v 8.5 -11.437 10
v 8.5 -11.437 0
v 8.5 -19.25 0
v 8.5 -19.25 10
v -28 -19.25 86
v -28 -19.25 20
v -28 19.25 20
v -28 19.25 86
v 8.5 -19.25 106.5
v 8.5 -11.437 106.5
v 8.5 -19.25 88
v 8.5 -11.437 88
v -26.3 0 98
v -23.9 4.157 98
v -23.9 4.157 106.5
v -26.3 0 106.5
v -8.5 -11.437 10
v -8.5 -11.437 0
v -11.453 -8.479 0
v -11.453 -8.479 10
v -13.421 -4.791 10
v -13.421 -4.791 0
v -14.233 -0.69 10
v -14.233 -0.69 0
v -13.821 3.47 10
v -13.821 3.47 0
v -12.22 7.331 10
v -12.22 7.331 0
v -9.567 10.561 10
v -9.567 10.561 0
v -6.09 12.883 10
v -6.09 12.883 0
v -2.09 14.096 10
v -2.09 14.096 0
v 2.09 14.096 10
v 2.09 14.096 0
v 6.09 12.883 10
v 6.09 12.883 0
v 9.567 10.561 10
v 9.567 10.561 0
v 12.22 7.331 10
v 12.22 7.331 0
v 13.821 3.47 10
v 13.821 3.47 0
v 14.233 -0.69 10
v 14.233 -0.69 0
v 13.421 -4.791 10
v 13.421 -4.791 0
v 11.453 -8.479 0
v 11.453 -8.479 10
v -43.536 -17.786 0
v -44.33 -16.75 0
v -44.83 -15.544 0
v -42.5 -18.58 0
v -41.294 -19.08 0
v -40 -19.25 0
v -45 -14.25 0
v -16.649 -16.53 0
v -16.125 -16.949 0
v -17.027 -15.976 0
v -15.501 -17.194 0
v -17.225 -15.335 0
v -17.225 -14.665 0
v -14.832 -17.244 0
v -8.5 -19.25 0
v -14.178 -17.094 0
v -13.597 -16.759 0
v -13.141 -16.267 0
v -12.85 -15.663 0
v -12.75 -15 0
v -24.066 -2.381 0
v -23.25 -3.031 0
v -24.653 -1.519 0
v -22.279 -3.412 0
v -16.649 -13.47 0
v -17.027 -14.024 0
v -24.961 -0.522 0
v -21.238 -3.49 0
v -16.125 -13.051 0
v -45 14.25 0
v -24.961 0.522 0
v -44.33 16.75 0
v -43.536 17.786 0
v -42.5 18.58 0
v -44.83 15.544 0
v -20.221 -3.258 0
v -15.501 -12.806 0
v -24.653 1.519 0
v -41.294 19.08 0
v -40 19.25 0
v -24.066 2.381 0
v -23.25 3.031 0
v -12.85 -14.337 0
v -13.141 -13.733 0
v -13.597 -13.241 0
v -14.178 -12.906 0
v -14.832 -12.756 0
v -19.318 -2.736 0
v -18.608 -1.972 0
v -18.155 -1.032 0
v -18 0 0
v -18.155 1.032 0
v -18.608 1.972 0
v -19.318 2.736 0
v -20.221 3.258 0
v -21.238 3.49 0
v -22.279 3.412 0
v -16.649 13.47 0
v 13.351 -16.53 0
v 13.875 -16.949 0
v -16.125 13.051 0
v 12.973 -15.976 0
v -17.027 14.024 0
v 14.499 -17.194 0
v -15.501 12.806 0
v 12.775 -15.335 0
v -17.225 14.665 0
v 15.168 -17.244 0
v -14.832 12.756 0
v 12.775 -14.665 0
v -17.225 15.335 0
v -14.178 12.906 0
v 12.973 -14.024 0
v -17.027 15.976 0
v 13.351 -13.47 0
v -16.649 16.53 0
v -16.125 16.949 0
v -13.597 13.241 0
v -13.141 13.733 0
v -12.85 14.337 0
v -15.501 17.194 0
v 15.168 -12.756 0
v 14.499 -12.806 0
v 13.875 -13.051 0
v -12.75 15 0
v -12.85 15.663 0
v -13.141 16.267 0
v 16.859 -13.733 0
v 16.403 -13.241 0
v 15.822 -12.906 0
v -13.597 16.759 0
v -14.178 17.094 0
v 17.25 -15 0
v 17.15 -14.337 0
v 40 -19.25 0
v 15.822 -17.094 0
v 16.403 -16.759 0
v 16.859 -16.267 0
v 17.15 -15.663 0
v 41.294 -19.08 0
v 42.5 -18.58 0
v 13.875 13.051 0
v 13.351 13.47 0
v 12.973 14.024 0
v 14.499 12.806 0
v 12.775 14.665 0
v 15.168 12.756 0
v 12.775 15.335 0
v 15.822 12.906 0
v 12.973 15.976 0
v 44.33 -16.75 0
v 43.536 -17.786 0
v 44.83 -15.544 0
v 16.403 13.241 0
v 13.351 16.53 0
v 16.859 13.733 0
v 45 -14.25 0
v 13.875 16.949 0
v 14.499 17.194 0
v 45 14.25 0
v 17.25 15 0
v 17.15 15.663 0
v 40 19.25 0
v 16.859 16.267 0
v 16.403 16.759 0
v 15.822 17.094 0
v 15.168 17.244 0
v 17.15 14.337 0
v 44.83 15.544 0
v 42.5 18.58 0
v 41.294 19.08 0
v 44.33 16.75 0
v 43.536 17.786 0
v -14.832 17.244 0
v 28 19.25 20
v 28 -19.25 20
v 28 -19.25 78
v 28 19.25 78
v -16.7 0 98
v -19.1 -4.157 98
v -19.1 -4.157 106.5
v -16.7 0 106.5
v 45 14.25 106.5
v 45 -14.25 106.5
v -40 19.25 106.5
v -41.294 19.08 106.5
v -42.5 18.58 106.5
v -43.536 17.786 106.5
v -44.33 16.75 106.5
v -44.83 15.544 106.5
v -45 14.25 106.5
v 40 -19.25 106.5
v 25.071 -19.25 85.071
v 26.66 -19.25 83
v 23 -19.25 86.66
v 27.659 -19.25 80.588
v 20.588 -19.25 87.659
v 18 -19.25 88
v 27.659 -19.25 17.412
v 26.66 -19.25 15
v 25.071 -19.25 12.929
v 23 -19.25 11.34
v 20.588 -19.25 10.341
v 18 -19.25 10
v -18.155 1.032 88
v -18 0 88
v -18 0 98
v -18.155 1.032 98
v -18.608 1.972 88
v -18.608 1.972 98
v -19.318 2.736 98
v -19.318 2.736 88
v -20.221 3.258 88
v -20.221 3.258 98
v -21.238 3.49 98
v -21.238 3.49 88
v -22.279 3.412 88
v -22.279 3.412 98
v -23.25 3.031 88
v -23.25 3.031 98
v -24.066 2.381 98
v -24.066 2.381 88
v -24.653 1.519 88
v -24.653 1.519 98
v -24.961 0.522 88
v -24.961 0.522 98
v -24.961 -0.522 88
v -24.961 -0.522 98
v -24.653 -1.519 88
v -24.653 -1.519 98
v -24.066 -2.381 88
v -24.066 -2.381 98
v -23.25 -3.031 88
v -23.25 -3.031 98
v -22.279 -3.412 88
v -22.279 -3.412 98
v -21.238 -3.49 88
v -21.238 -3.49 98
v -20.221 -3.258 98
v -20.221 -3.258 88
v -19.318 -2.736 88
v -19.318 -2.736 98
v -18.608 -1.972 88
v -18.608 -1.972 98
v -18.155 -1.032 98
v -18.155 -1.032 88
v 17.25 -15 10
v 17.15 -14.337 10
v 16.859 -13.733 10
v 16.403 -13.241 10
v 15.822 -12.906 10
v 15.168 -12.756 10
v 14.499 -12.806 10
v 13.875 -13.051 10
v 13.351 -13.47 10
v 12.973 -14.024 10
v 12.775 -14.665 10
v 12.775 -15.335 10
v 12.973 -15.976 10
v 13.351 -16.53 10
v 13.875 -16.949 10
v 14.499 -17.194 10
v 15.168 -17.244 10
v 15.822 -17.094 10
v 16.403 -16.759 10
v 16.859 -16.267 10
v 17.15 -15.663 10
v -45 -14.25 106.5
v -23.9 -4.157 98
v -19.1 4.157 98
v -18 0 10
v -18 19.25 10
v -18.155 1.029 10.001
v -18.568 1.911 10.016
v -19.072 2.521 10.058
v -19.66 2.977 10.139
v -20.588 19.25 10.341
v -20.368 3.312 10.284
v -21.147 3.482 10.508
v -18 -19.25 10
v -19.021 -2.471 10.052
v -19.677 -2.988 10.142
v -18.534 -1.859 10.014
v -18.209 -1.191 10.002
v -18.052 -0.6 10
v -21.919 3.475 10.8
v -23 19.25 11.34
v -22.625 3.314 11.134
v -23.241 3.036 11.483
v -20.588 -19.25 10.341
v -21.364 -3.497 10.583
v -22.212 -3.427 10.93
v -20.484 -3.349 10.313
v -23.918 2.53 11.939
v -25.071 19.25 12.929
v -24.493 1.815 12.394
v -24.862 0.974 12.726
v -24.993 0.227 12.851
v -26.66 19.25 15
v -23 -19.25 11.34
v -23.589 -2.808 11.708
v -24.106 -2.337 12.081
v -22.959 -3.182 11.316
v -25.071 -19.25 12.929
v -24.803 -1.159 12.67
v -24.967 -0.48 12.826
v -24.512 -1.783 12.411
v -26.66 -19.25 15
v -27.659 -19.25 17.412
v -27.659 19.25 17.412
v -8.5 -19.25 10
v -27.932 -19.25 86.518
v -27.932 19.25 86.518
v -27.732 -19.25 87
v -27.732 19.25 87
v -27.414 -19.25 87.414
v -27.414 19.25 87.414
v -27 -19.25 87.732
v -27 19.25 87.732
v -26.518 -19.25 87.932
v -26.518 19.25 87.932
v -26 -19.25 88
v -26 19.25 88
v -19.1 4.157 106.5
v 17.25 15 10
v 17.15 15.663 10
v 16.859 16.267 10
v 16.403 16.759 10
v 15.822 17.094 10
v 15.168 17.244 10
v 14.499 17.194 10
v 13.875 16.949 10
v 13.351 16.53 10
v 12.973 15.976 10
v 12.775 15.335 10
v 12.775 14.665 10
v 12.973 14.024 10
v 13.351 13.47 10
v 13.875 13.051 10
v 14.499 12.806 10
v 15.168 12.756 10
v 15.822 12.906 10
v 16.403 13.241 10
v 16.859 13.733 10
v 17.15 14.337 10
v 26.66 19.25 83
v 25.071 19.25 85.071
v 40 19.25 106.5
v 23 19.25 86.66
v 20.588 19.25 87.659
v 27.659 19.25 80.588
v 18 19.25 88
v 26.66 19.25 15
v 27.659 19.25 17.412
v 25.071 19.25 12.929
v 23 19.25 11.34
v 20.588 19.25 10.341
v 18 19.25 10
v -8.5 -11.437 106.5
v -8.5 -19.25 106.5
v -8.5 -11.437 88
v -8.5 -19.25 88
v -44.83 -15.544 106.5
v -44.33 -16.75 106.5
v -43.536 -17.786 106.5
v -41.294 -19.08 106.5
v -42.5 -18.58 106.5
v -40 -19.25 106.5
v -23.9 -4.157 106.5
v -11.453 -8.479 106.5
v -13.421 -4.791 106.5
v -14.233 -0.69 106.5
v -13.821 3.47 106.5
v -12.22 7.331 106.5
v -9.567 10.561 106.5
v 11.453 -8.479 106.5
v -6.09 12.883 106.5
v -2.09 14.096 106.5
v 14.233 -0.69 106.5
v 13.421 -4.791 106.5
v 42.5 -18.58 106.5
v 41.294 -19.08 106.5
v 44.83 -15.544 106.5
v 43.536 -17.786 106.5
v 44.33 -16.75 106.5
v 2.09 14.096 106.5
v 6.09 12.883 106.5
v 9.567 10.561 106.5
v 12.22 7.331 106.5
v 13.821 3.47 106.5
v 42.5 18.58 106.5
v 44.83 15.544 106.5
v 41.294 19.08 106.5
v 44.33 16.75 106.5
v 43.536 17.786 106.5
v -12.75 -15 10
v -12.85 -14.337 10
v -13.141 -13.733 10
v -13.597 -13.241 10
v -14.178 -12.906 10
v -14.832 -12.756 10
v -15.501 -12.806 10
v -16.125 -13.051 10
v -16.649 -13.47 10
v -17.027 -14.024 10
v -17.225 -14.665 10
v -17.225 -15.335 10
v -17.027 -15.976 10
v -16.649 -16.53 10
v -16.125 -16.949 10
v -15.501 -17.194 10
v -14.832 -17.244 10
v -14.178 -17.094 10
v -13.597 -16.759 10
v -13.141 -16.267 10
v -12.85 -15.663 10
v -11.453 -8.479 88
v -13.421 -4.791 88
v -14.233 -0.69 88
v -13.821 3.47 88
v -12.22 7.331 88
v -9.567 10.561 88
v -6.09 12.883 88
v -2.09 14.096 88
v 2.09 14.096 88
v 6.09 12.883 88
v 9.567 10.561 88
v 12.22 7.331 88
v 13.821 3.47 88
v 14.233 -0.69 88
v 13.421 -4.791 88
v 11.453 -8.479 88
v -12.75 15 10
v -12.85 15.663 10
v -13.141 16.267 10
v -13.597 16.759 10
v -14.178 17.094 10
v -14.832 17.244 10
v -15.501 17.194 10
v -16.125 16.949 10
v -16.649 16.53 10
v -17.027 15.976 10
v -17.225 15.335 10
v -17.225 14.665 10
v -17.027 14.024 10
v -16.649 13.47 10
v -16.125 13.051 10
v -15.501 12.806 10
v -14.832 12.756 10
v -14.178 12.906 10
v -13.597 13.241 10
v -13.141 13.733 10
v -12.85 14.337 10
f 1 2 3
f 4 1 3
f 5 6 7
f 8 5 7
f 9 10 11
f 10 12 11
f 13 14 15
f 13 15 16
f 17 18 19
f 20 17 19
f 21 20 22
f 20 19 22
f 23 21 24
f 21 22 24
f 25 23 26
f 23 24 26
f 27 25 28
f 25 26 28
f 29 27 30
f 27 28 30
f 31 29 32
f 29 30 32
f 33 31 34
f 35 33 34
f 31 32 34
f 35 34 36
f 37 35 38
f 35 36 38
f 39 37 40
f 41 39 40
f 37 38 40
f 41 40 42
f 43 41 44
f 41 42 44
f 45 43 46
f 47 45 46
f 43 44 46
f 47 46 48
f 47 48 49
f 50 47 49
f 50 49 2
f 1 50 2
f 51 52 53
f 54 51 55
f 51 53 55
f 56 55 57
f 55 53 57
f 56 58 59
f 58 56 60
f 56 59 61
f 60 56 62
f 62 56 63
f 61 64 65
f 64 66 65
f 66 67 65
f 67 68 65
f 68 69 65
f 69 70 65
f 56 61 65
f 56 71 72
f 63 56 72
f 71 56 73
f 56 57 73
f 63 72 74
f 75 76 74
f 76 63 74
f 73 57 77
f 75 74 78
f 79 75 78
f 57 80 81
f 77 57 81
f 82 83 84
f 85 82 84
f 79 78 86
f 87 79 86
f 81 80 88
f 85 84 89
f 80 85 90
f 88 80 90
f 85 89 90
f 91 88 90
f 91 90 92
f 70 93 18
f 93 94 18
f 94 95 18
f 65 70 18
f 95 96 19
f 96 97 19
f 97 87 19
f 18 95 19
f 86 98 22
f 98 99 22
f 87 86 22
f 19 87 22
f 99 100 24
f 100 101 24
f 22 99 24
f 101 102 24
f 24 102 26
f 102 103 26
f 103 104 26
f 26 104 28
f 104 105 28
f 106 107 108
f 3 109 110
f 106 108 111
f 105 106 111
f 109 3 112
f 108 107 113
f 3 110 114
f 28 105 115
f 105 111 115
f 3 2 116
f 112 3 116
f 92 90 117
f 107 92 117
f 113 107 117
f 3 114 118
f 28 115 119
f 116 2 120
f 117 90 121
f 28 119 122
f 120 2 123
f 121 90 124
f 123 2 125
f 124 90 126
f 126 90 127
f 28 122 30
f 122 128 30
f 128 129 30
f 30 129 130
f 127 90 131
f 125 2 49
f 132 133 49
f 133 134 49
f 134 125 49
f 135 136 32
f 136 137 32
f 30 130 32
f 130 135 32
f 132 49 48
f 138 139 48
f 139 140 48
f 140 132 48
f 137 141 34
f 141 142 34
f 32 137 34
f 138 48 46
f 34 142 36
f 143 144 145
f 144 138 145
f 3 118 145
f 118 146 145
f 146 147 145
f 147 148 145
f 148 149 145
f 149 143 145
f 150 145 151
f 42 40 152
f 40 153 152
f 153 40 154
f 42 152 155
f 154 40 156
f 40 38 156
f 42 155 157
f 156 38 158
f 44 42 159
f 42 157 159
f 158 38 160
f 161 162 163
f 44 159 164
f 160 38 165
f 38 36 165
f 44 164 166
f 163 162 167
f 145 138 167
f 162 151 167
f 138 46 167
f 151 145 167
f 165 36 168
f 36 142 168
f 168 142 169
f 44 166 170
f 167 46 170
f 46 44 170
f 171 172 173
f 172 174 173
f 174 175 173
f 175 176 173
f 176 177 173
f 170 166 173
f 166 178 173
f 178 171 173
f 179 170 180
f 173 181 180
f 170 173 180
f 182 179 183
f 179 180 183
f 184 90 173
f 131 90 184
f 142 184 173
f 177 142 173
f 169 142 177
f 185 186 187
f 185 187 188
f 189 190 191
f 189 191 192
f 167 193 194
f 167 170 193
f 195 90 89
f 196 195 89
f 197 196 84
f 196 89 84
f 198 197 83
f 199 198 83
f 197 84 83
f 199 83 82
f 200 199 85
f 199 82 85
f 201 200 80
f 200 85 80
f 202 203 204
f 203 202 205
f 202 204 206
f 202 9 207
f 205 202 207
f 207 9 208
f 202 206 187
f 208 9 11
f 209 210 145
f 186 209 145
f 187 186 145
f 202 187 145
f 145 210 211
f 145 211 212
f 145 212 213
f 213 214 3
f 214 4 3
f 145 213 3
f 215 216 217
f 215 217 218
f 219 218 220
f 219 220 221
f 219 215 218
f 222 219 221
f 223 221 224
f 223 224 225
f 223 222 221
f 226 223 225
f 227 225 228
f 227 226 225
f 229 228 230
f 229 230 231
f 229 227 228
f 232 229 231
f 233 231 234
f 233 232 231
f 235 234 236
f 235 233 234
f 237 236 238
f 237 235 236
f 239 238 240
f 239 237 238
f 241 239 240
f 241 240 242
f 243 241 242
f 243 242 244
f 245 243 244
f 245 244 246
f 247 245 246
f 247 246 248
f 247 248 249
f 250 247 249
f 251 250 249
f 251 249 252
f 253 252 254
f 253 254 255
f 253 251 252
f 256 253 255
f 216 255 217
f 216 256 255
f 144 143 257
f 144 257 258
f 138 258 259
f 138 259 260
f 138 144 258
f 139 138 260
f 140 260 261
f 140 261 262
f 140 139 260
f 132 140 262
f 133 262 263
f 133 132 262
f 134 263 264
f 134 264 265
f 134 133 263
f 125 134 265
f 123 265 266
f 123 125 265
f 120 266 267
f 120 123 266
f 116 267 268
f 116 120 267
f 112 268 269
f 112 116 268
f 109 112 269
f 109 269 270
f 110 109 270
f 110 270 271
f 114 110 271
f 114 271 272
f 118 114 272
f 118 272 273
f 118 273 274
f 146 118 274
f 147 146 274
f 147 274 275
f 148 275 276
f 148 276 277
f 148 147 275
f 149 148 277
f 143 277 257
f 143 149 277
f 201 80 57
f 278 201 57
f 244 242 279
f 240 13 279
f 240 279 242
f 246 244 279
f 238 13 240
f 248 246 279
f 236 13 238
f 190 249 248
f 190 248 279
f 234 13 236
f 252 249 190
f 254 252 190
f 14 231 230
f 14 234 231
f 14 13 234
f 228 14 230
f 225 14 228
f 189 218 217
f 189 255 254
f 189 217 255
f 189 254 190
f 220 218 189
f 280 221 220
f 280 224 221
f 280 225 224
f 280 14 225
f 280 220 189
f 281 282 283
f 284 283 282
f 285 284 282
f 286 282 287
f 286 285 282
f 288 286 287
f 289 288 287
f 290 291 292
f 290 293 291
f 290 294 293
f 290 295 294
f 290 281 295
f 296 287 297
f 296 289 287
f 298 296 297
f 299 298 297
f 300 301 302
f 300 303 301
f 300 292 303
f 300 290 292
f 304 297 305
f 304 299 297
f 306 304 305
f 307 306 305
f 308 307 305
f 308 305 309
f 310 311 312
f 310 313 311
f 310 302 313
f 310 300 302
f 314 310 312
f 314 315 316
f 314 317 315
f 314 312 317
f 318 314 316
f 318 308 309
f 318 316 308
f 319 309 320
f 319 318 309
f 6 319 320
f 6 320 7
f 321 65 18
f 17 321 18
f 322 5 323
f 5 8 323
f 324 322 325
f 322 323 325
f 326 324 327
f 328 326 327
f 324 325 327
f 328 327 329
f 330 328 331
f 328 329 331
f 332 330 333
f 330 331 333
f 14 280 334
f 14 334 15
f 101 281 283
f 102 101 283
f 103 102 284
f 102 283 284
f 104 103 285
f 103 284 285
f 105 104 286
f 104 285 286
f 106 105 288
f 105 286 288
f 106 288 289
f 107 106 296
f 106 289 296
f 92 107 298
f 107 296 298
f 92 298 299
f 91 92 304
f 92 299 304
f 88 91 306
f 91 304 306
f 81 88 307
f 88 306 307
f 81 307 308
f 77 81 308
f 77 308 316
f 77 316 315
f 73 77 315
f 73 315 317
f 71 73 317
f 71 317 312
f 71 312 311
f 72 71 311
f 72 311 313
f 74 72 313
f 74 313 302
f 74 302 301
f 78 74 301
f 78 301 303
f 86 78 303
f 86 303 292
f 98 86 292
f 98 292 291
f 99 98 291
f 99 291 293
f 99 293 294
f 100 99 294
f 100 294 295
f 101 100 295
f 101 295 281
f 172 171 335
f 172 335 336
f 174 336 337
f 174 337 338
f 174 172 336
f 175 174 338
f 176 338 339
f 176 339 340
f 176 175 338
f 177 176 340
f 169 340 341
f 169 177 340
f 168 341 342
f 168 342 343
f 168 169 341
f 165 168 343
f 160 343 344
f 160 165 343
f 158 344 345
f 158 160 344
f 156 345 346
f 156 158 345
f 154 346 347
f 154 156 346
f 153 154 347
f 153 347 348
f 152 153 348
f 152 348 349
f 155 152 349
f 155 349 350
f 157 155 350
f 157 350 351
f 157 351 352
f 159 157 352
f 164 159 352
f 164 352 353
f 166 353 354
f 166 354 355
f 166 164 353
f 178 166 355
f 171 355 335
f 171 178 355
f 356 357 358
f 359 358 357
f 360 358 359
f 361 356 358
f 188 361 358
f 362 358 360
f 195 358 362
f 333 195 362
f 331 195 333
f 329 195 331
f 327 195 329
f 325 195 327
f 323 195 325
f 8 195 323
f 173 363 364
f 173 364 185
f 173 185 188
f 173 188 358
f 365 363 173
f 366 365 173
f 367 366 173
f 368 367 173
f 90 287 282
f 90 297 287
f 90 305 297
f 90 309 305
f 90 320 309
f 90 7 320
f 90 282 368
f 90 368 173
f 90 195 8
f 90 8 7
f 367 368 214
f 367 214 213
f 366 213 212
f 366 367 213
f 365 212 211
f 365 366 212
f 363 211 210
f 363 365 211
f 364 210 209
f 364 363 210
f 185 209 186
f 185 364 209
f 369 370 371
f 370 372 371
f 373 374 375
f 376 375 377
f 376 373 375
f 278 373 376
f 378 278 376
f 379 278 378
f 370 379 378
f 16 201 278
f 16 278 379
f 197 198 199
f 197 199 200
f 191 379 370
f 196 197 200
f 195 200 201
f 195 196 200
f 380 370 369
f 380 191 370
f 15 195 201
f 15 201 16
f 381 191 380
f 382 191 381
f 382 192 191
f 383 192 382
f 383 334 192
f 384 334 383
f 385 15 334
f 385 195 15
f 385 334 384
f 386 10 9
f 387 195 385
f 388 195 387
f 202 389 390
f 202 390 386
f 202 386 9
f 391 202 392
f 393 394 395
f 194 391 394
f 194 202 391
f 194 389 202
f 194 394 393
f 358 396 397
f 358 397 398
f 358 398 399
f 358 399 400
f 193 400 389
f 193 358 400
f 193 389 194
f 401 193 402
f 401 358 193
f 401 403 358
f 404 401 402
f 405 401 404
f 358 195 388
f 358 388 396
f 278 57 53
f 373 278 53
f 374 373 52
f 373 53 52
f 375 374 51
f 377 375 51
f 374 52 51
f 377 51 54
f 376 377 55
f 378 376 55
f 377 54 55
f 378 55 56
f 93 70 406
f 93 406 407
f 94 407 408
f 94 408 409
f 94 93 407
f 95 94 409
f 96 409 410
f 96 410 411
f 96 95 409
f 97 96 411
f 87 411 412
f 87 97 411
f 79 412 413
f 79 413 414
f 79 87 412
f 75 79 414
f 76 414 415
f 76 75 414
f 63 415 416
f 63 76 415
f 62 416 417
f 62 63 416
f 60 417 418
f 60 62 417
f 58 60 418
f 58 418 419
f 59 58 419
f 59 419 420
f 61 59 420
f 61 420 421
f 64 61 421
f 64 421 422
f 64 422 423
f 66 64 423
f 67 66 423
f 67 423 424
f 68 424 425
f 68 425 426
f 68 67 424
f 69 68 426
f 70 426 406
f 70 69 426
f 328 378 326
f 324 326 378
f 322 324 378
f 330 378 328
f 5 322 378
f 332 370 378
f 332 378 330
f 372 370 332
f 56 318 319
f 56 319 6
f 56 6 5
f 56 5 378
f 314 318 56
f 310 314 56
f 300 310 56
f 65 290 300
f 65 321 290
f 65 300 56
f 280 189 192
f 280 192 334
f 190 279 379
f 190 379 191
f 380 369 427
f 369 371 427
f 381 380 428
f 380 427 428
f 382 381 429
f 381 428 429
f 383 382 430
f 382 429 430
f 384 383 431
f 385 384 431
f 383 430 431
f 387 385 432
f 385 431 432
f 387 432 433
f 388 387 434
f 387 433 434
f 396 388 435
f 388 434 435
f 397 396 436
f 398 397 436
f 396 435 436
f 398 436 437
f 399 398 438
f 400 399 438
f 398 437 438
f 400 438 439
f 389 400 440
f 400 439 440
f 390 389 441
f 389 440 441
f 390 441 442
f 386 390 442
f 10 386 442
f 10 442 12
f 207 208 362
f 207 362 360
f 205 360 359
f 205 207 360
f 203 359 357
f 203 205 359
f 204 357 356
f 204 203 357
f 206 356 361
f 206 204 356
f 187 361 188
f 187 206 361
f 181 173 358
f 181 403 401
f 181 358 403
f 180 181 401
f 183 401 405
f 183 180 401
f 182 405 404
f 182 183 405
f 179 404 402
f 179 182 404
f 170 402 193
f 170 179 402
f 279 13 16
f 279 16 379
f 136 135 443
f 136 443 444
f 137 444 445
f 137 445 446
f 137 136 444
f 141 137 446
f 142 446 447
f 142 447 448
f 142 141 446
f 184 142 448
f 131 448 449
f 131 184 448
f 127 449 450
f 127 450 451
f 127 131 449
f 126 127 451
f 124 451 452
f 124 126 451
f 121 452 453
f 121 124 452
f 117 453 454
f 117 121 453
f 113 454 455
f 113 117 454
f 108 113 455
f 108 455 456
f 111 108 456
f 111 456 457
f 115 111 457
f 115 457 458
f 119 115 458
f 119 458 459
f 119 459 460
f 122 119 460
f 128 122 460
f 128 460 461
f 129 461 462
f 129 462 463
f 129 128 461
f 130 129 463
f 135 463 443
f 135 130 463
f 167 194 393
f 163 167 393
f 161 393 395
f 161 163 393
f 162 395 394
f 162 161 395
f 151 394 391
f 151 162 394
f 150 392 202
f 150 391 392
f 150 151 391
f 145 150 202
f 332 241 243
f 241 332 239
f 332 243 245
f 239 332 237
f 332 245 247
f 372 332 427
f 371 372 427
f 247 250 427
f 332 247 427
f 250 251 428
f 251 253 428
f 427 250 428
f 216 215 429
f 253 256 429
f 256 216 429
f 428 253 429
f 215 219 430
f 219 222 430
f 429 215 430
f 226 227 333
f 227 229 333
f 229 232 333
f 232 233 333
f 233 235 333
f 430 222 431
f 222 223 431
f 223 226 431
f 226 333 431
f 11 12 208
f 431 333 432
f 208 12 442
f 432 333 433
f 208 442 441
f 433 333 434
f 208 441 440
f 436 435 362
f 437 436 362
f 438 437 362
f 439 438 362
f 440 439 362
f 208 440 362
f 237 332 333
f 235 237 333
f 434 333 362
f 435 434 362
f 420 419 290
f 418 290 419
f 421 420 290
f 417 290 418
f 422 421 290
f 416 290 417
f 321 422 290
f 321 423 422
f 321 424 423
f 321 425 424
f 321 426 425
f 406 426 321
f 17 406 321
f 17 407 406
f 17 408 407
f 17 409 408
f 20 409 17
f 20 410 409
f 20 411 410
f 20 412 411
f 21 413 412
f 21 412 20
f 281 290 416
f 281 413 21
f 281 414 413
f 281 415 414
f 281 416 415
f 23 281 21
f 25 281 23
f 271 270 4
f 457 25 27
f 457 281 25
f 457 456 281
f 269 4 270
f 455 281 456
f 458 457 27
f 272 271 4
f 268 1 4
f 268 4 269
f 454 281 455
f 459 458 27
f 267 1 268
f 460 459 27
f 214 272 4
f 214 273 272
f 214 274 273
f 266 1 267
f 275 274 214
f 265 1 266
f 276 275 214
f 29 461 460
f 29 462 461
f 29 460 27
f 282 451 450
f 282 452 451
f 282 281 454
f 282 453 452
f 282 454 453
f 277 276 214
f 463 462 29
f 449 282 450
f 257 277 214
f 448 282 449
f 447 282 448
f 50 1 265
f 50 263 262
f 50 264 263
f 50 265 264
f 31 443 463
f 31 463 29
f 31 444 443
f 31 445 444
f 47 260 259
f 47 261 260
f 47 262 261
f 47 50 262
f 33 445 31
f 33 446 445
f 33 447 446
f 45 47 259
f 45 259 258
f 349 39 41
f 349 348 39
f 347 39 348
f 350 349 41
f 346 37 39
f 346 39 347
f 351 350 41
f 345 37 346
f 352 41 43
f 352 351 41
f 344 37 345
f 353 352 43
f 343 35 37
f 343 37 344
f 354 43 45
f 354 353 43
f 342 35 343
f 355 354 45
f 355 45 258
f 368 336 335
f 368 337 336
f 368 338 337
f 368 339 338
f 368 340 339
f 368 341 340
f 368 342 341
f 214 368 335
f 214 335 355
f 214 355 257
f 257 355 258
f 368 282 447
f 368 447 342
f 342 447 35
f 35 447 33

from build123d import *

# Parameters (mm, degrees)
SKETCH1_R             = 2.25
BOSS_EXTRUDE1_DEPTH   = 10
BOSS_EXTRUDE3_DEPTH   = 78
BOSS_EXTRUDE3_2_DEPTH = 78
SKETCH4_R             = 3.5
BOSS_EXTRUDE4_DEPTH   = 10
BOSS_EXTRUDE5_DEPTH   = 8.5
SKETCH5_R             = 3.5
CUT_EXTRUDE1_DEPTH    = 110.542514578
FILLET2_R             = 2
FILLET3_R             = 10


with BuildPart() as part:
    # Sketch1 → Boss-Extrude1 (new body)
    with BuildSketch(Plane.XY):
        with BuildLine():
            Line((15, 19.25), (-15, 19.25))
            Line((-15, 19.25), (-30, 19.25))
            Line((-30, 19.25), (-40, 19.25))
            ThreePointArc((-40, 19.25), (-43.535533906, 17.785533906), (-45, 14.25))
            Line((-45, 14.25), (-45, -14.25))
            ThreePointArc((-45, -14.25), (-43.535533906, -17.785533906), (-40, -19.25))
            Line((-40, -19.25), (-30, -19.25))
            Line((-30, -19.25), (-15, -19.25))
            Line((-15, -19.25), (-8.5, -19.25))
            Line((-8.5, -19.25), (-8.5, -16.75))
            Line((-8.5, -16.75), (-8.5, -11.437329234))
            ThreePointArc((-8.5, -11.437329234), (0, 14.25), (8.5, -11.437329234))
            Line((8.5, -11.437329234), (8.5, -16.75))
            Line((8.5, -16.75), (8.5, -19.25))
            Line((8.5, -19.25), (15, -19.25))
            Line((15, -19.25), (30, -19.25))
            Line((30, -19.25), (40, -19.25))
            ThreePointArc((40, -19.25), (43.535533906, -17.785533906), (45, -14.25))
            Line((45, -14.25), (45, 14.25))
            ThreePointArc((45, 14.25), (43.535533906, 17.785533906), (40, 19.25))
            Line((40, 19.25), (30, 19.25))
            Line((30, 19.25), (15, 19.25))
        make_face()
        with Locations((-15, -15)):
            Circle(SKETCH1_R, mode=Mode.SUBTRACT)
        with Locations((15, -15)):
            Circle(SKETCH1_R, mode=Mode.SUBTRACT)
        with Locations((-15, 15)):
            Circle(SKETCH1_R, mode=Mode.SUBTRACT)
        with Locations((15, 15)):
            Circle(SKETCH1_R, mode=Mode.SUBTRACT)
    extrude(amount=BOSS_EXTRUDE1_DEPTH)

    # Sketch5 → Cut-Extrude1 (cut, through all)
    with BuildSketch(Plane.XY.offset(98)):
        with Locations((-21.5, 0)):
            Circle(SKETCH5_R)
    extrude(amount=-CUT_EXTRUDE1_DEPTH, mode=Mode.SUBTRACT)


with BuildPart() as body_2:
    # Sketch2 → Boss-Extrude3 (new body)
    with BuildSketch(Plane.XY.offset(10)):
        with BuildLine():
            Line((-45, 14.25), (-45, -14.25))
            ThreePointArc((-45, -14.25), (-43.535533906, -17.785533906), (-40, -19.25))
            Line((-40, -19.25), (-28, -19.25))
            Line((-28, -19.25), (-28, 0))
            Line((-28, 0), (-28, 19.25))
            Line((-28, 19.25), (-40, 19.25))
            ThreePointArc((-40, 19.25), (-43.535533906, 17.785533906), (-45, 14.25))
        make_face()
    extrude(amount=BOSS_EXTRUDE3_DEPTH)

    # Sketch4 → Boss-Extrude4 (add)
    with BuildSketch(Plane.XY.offset(88)):
        with BuildLine():
            Line((-45, 14.25), (-45, -14.25))
            ThreePointArc((-45, -14.25), (-43.535533906, -17.785533906), (-40, -19.25))
            Line((-40, -19.25), (-8.5, -19.25))
            Line((-8.5, -19.25), (-8.5, -11.437329234))
            ThreePointArc((-8.5, -11.437329234), (0, 14.25), (8.5, -11.437329234))
            Line((8.5, -11.437329234), (8.5, -19.25))
            Line((8.5, -19.25), (40, -19.25))
            ThreePointArc((40, -19.25), (43.535533906, -17.785533906), (45, -14.25))
            Line((45, -14.25), (45, 14.25))
            ThreePointArc((45, 14.25), (43.535533906, 17.785533906), (40, 19.25))
            Line((40, 19.25), (-40, 19.25))
            ThreePointArc((-40, 19.25), (-43.535533906, 17.785533906), (-45, 14.25))
        make_face()
        with Locations((-21.5, 0)):
            Circle(SKETCH4_R, mode=Mode.SUBTRACT)
    extrude(amount=BOSS_EXTRUDE4_DEPTH)

    # Sketch6 → Boss-Extrude5 (add)
    with BuildSketch(Plane.XY.offset(98)):
        with BuildLine():
            Line((-40, -19.25), (-8.5, -19.25))
            Line((-8.5, -19.25), (-8.5, -11.437329234))
            ThreePointArc((-8.5, -11.437329234), (0, 14.25), (8.5, -11.437329234))
            Line((8.5, -11.437329234), (8.5, -19.25))
            Line((8.5, -19.25), (40, -19.25))
            ThreePointArc((40, -19.25), (43.535533906, -17.785533906), (45, -14.25))
            Line((45, -14.25), (45, 14.25))
            ThreePointArc((45, 14.25), (43.535533906, 17.785533906), (40, 19.25))
            Line((40, 19.25), (-40, 19.25))
            ThreePointArc((-40, 19.25), (-43.535533906, 17.785533906), (-45, 14.25))
            Line((-45, 14.25), (-45, -14.25))
            ThreePointArc((-45, -14.25), (-43.535533906, -17.785533906), (-40, -19.25))
        make_face()
        Polygon((-16.7, 0), (-19.1, 4.156921938), (-23.9, 4.156921938), (-26.3, 0), (-23.9, -4.156921938), (-19.1, -4.156921938), align=None, mode=Mode.SUBTRACT)
    extrude(amount=BOSS_EXTRUDE5_DEPTH)


with BuildPart() as body_3:
    # Sketch2 → Boss-Extrude3 2 (new body)
    with BuildSketch(Plane.XY.offset(10)):
        with BuildLine():
            Line((40, -19.25), (28, -19.25))
            Line((28, -19.25), (28, 0))
            Line((28, 0), (28, 19.25))
            Line((28, 19.25), (40, 19.25))
            ThreePointArc((40, 19.25), (43.535533906, 17.785533906), (45, 14.25))
            Line((45, 14.25), (45, -14.25))
            ThreePointArc((45, -14.25), (43.535533906, -17.785533906), (40, -19.25))
        make_face()
    extrude(amount=BOSS_EXTRUDE3_2_DEPTH)


with BuildPart() as part_1:
    add(part.part)

    # Combine1: union body 2, body 3
    add(body_2.part)
    add(body_3.part)

    # Fillet2
    fillet2_edges = [part_1.edges().sort_by_distance(p)[0] for p in [
        (-28, 0, 88),
    ]]
    fillet(fillet2_edges, radius=FILLET2_R)

    # Fillet3
    # the kernel refuses this fillet: 10 mm, written as the material it adds along each edge
    with BuildSketch(Plane(origin=(28, -19.25, 88), x_dir=(-1, 0, 0), z_dir=(0, 1, 0))) as fillet3_piece_1:
        with BuildLine():
            CenterArc((FILLET3_R, -FILLET3_R), FILLET3_R, 90, 90)
            Line((0, -FILLET3_R), (-FILLET3_R * 0.02, -FILLET3_R))
            Line((-FILLET3_R * 0.02, -FILLET3_R), (-FILLET3_R * 0.02, FILLET3_R * 0.02))
            Line((-FILLET3_R * 0.02, FILLET3_R * 0.02), (FILLET3_R, FILLET3_R * 0.02))
            Line((FILLET3_R, FILLET3_R * 0.02), (FILLET3_R, 0))
        make_face()
    extrude(amount=38.5)
    with BuildSketch(Plane(origin=(-28, -19.25, 10), x_dir=(0, 0, 1), z_dir=(0, 1, 0))) as fillet3_piece_2_section:
        with BuildLine():
            CenterArc((FILLET3_R, FILLET3_R), FILLET3_R, 180, 90)
            Line((0, FILLET3_R), (-FILLET3_R * 0.02, FILLET3_R))
            Line((-FILLET3_R * 0.02, FILLET3_R), (-FILLET3_R * 0.02, -FILLET3_R * 0.02))
            Line((-FILLET3_R * 0.02, -FILLET3_R * 0.02), (FILLET3_R, -FILLET3_R * 0.02))
            Line((FILLET3_R, -FILLET3_R * 0.02), (FILLET3_R, 0))
        make_face()
    fillet3_piece_2 = extrude(amount=38.5, mode=Mode.PRIVATE)
    fillet3_piece_2 = fillet3_piece_2 - Plane(origin=(-21.5, 0, 12.335340949), x_dir=(1, 0, 0), z_dir=(0, 0, 1)) * Cylinder(3.5, 117, mode=Mode.PRIVATE)
    add(fillet3_piece_2)
    with BuildSketch(Plane(origin=(28, 19.25, 10), x_dir=(0, 0, 1), z_dir=(0, -1, 0))) as fillet3_piece_3:
        with BuildLine():
            CenterArc((FILLET3_R, FILLET3_R), FILLET3_R, 180, 90)
            Line((0, FILLET3_R), (-FILLET3_R * 0.02, FILLET3_R))
            Line((-FILLET3_R * 0.02, FILLET3_R), (-FILLET3_R * 0.02, -FILLET3_R * 0.02))
            Line((-FILLET3_R * 0.02, -FILLET3_R * 0.02), (FILLET3_R, -FILLET3_R * 0.02))
            Line((FILLET3_R, -FILLET3_R * 0.02), (FILLET3_R, 0))
        make_face()
    extrude(amount=38.5)


solid = part_1.part
